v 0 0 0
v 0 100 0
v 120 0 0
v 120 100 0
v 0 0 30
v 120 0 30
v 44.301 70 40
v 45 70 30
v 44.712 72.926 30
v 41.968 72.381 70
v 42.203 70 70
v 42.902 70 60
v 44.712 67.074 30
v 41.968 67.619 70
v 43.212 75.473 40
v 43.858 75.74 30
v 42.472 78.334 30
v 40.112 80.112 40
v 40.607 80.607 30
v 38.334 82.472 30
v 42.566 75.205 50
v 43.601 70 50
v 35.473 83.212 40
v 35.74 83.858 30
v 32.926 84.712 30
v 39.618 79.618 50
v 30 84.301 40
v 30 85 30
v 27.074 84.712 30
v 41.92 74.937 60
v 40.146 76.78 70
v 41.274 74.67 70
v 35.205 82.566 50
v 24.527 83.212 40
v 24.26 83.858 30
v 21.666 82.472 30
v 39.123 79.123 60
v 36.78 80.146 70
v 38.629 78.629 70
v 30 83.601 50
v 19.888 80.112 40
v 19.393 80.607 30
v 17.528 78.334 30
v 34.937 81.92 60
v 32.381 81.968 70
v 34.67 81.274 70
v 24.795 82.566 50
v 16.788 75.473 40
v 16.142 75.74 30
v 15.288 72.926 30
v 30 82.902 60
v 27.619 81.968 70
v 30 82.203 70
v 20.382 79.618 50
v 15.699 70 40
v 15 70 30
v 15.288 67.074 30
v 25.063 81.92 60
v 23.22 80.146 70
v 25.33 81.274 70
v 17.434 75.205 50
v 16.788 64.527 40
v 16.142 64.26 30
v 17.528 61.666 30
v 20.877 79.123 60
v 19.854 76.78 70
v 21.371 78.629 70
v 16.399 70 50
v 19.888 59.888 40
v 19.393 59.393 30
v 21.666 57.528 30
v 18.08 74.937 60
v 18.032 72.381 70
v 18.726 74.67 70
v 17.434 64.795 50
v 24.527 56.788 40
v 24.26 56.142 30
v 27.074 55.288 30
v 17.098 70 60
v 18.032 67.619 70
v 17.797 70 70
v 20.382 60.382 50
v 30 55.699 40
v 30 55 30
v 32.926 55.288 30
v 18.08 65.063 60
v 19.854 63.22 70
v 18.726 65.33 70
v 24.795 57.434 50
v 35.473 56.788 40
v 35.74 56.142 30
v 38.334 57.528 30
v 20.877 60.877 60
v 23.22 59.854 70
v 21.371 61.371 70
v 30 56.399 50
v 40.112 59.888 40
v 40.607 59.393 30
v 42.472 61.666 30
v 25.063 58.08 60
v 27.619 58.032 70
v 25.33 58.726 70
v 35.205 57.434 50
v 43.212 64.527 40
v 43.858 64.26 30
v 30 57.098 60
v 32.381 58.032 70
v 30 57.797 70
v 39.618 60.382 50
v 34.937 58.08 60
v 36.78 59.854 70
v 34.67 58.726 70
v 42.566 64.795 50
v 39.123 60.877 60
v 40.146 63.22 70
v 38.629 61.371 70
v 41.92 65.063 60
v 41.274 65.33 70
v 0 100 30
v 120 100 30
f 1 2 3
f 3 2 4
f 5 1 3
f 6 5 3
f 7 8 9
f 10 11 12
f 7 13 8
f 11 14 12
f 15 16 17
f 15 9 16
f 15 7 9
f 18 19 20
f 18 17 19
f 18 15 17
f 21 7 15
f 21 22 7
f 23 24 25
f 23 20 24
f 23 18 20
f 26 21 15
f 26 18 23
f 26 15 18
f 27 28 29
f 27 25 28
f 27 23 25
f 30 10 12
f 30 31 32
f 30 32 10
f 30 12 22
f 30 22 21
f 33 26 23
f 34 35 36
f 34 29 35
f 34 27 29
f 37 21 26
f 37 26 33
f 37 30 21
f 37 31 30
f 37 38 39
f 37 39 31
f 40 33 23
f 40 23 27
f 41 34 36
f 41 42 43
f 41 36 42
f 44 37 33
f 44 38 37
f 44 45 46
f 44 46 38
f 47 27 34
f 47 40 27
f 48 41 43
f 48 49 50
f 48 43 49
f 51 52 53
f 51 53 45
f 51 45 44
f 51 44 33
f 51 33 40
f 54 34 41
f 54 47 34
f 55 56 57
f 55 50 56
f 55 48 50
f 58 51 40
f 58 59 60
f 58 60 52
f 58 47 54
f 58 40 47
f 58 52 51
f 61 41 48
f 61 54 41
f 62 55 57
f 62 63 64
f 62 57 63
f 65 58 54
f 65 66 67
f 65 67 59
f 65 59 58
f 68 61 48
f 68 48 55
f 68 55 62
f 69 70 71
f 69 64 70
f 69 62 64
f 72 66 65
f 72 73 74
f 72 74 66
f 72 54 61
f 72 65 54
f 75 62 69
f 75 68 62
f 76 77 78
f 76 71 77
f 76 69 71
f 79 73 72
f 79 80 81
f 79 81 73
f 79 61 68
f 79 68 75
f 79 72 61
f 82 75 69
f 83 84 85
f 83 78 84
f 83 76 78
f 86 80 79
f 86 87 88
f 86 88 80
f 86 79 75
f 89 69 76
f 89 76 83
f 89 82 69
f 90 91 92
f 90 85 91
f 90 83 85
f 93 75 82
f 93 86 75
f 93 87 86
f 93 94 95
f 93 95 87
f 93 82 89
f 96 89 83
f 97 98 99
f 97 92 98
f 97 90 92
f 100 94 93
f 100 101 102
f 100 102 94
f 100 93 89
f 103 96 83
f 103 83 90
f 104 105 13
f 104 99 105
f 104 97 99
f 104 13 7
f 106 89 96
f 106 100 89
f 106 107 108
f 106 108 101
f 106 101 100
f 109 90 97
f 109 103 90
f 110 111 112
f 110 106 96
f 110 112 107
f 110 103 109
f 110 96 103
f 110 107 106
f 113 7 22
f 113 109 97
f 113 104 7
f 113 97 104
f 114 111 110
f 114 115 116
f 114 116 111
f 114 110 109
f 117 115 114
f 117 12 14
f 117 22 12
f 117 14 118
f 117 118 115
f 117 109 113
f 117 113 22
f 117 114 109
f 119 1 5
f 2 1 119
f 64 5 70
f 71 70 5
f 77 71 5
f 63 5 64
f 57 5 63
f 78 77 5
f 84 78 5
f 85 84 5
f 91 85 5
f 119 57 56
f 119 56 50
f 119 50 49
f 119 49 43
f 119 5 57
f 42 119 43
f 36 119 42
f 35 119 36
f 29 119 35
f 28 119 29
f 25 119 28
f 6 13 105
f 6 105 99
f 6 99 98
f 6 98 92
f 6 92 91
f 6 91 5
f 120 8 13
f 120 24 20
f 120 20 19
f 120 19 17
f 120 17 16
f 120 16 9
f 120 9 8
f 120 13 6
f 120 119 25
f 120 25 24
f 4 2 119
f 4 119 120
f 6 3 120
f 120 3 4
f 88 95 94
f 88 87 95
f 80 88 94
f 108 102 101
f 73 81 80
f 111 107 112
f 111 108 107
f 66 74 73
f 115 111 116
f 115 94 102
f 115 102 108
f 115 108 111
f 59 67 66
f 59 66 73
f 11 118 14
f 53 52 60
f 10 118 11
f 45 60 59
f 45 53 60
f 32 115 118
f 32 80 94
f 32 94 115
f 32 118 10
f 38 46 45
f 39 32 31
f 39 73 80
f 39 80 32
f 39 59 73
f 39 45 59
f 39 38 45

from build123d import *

# Parameters (mm, degrees)
CROQUIS1_W              = 120
CROQUIS1_H              = 100
SALIENTE_EXTRUIR1_DEPTH = 30
CROQUIS3_R              = 15
SALIENTE_EXTRUIR3_DEPTH = 40
SALIENTE_EXTRUIR3_TAPER = 4


with BuildPart() as part:
    # Croquis1 → Saliente-Extruir1 (new body)
    with BuildSketch(Plane.XY):
        with Locations((60, 50)):
            Rectangle(CROQUIS1_W, CROQUIS1_H)
    extrude(amount=SALIENTE_EXTRUIR1_DEPTH)

    # Croquis3 → Saliente-Extruir3 (add)
    with BuildSketch(Plane.XY.offset(30)):
        with Locations((30, 70)):
            Circle(CROQUIS3_R)
    extrude(amount=SALIENTE_EXTRUIR3_DEPTH, taper=SALIENTE_EXTRUIR3_TAPER)


solid = part.part
